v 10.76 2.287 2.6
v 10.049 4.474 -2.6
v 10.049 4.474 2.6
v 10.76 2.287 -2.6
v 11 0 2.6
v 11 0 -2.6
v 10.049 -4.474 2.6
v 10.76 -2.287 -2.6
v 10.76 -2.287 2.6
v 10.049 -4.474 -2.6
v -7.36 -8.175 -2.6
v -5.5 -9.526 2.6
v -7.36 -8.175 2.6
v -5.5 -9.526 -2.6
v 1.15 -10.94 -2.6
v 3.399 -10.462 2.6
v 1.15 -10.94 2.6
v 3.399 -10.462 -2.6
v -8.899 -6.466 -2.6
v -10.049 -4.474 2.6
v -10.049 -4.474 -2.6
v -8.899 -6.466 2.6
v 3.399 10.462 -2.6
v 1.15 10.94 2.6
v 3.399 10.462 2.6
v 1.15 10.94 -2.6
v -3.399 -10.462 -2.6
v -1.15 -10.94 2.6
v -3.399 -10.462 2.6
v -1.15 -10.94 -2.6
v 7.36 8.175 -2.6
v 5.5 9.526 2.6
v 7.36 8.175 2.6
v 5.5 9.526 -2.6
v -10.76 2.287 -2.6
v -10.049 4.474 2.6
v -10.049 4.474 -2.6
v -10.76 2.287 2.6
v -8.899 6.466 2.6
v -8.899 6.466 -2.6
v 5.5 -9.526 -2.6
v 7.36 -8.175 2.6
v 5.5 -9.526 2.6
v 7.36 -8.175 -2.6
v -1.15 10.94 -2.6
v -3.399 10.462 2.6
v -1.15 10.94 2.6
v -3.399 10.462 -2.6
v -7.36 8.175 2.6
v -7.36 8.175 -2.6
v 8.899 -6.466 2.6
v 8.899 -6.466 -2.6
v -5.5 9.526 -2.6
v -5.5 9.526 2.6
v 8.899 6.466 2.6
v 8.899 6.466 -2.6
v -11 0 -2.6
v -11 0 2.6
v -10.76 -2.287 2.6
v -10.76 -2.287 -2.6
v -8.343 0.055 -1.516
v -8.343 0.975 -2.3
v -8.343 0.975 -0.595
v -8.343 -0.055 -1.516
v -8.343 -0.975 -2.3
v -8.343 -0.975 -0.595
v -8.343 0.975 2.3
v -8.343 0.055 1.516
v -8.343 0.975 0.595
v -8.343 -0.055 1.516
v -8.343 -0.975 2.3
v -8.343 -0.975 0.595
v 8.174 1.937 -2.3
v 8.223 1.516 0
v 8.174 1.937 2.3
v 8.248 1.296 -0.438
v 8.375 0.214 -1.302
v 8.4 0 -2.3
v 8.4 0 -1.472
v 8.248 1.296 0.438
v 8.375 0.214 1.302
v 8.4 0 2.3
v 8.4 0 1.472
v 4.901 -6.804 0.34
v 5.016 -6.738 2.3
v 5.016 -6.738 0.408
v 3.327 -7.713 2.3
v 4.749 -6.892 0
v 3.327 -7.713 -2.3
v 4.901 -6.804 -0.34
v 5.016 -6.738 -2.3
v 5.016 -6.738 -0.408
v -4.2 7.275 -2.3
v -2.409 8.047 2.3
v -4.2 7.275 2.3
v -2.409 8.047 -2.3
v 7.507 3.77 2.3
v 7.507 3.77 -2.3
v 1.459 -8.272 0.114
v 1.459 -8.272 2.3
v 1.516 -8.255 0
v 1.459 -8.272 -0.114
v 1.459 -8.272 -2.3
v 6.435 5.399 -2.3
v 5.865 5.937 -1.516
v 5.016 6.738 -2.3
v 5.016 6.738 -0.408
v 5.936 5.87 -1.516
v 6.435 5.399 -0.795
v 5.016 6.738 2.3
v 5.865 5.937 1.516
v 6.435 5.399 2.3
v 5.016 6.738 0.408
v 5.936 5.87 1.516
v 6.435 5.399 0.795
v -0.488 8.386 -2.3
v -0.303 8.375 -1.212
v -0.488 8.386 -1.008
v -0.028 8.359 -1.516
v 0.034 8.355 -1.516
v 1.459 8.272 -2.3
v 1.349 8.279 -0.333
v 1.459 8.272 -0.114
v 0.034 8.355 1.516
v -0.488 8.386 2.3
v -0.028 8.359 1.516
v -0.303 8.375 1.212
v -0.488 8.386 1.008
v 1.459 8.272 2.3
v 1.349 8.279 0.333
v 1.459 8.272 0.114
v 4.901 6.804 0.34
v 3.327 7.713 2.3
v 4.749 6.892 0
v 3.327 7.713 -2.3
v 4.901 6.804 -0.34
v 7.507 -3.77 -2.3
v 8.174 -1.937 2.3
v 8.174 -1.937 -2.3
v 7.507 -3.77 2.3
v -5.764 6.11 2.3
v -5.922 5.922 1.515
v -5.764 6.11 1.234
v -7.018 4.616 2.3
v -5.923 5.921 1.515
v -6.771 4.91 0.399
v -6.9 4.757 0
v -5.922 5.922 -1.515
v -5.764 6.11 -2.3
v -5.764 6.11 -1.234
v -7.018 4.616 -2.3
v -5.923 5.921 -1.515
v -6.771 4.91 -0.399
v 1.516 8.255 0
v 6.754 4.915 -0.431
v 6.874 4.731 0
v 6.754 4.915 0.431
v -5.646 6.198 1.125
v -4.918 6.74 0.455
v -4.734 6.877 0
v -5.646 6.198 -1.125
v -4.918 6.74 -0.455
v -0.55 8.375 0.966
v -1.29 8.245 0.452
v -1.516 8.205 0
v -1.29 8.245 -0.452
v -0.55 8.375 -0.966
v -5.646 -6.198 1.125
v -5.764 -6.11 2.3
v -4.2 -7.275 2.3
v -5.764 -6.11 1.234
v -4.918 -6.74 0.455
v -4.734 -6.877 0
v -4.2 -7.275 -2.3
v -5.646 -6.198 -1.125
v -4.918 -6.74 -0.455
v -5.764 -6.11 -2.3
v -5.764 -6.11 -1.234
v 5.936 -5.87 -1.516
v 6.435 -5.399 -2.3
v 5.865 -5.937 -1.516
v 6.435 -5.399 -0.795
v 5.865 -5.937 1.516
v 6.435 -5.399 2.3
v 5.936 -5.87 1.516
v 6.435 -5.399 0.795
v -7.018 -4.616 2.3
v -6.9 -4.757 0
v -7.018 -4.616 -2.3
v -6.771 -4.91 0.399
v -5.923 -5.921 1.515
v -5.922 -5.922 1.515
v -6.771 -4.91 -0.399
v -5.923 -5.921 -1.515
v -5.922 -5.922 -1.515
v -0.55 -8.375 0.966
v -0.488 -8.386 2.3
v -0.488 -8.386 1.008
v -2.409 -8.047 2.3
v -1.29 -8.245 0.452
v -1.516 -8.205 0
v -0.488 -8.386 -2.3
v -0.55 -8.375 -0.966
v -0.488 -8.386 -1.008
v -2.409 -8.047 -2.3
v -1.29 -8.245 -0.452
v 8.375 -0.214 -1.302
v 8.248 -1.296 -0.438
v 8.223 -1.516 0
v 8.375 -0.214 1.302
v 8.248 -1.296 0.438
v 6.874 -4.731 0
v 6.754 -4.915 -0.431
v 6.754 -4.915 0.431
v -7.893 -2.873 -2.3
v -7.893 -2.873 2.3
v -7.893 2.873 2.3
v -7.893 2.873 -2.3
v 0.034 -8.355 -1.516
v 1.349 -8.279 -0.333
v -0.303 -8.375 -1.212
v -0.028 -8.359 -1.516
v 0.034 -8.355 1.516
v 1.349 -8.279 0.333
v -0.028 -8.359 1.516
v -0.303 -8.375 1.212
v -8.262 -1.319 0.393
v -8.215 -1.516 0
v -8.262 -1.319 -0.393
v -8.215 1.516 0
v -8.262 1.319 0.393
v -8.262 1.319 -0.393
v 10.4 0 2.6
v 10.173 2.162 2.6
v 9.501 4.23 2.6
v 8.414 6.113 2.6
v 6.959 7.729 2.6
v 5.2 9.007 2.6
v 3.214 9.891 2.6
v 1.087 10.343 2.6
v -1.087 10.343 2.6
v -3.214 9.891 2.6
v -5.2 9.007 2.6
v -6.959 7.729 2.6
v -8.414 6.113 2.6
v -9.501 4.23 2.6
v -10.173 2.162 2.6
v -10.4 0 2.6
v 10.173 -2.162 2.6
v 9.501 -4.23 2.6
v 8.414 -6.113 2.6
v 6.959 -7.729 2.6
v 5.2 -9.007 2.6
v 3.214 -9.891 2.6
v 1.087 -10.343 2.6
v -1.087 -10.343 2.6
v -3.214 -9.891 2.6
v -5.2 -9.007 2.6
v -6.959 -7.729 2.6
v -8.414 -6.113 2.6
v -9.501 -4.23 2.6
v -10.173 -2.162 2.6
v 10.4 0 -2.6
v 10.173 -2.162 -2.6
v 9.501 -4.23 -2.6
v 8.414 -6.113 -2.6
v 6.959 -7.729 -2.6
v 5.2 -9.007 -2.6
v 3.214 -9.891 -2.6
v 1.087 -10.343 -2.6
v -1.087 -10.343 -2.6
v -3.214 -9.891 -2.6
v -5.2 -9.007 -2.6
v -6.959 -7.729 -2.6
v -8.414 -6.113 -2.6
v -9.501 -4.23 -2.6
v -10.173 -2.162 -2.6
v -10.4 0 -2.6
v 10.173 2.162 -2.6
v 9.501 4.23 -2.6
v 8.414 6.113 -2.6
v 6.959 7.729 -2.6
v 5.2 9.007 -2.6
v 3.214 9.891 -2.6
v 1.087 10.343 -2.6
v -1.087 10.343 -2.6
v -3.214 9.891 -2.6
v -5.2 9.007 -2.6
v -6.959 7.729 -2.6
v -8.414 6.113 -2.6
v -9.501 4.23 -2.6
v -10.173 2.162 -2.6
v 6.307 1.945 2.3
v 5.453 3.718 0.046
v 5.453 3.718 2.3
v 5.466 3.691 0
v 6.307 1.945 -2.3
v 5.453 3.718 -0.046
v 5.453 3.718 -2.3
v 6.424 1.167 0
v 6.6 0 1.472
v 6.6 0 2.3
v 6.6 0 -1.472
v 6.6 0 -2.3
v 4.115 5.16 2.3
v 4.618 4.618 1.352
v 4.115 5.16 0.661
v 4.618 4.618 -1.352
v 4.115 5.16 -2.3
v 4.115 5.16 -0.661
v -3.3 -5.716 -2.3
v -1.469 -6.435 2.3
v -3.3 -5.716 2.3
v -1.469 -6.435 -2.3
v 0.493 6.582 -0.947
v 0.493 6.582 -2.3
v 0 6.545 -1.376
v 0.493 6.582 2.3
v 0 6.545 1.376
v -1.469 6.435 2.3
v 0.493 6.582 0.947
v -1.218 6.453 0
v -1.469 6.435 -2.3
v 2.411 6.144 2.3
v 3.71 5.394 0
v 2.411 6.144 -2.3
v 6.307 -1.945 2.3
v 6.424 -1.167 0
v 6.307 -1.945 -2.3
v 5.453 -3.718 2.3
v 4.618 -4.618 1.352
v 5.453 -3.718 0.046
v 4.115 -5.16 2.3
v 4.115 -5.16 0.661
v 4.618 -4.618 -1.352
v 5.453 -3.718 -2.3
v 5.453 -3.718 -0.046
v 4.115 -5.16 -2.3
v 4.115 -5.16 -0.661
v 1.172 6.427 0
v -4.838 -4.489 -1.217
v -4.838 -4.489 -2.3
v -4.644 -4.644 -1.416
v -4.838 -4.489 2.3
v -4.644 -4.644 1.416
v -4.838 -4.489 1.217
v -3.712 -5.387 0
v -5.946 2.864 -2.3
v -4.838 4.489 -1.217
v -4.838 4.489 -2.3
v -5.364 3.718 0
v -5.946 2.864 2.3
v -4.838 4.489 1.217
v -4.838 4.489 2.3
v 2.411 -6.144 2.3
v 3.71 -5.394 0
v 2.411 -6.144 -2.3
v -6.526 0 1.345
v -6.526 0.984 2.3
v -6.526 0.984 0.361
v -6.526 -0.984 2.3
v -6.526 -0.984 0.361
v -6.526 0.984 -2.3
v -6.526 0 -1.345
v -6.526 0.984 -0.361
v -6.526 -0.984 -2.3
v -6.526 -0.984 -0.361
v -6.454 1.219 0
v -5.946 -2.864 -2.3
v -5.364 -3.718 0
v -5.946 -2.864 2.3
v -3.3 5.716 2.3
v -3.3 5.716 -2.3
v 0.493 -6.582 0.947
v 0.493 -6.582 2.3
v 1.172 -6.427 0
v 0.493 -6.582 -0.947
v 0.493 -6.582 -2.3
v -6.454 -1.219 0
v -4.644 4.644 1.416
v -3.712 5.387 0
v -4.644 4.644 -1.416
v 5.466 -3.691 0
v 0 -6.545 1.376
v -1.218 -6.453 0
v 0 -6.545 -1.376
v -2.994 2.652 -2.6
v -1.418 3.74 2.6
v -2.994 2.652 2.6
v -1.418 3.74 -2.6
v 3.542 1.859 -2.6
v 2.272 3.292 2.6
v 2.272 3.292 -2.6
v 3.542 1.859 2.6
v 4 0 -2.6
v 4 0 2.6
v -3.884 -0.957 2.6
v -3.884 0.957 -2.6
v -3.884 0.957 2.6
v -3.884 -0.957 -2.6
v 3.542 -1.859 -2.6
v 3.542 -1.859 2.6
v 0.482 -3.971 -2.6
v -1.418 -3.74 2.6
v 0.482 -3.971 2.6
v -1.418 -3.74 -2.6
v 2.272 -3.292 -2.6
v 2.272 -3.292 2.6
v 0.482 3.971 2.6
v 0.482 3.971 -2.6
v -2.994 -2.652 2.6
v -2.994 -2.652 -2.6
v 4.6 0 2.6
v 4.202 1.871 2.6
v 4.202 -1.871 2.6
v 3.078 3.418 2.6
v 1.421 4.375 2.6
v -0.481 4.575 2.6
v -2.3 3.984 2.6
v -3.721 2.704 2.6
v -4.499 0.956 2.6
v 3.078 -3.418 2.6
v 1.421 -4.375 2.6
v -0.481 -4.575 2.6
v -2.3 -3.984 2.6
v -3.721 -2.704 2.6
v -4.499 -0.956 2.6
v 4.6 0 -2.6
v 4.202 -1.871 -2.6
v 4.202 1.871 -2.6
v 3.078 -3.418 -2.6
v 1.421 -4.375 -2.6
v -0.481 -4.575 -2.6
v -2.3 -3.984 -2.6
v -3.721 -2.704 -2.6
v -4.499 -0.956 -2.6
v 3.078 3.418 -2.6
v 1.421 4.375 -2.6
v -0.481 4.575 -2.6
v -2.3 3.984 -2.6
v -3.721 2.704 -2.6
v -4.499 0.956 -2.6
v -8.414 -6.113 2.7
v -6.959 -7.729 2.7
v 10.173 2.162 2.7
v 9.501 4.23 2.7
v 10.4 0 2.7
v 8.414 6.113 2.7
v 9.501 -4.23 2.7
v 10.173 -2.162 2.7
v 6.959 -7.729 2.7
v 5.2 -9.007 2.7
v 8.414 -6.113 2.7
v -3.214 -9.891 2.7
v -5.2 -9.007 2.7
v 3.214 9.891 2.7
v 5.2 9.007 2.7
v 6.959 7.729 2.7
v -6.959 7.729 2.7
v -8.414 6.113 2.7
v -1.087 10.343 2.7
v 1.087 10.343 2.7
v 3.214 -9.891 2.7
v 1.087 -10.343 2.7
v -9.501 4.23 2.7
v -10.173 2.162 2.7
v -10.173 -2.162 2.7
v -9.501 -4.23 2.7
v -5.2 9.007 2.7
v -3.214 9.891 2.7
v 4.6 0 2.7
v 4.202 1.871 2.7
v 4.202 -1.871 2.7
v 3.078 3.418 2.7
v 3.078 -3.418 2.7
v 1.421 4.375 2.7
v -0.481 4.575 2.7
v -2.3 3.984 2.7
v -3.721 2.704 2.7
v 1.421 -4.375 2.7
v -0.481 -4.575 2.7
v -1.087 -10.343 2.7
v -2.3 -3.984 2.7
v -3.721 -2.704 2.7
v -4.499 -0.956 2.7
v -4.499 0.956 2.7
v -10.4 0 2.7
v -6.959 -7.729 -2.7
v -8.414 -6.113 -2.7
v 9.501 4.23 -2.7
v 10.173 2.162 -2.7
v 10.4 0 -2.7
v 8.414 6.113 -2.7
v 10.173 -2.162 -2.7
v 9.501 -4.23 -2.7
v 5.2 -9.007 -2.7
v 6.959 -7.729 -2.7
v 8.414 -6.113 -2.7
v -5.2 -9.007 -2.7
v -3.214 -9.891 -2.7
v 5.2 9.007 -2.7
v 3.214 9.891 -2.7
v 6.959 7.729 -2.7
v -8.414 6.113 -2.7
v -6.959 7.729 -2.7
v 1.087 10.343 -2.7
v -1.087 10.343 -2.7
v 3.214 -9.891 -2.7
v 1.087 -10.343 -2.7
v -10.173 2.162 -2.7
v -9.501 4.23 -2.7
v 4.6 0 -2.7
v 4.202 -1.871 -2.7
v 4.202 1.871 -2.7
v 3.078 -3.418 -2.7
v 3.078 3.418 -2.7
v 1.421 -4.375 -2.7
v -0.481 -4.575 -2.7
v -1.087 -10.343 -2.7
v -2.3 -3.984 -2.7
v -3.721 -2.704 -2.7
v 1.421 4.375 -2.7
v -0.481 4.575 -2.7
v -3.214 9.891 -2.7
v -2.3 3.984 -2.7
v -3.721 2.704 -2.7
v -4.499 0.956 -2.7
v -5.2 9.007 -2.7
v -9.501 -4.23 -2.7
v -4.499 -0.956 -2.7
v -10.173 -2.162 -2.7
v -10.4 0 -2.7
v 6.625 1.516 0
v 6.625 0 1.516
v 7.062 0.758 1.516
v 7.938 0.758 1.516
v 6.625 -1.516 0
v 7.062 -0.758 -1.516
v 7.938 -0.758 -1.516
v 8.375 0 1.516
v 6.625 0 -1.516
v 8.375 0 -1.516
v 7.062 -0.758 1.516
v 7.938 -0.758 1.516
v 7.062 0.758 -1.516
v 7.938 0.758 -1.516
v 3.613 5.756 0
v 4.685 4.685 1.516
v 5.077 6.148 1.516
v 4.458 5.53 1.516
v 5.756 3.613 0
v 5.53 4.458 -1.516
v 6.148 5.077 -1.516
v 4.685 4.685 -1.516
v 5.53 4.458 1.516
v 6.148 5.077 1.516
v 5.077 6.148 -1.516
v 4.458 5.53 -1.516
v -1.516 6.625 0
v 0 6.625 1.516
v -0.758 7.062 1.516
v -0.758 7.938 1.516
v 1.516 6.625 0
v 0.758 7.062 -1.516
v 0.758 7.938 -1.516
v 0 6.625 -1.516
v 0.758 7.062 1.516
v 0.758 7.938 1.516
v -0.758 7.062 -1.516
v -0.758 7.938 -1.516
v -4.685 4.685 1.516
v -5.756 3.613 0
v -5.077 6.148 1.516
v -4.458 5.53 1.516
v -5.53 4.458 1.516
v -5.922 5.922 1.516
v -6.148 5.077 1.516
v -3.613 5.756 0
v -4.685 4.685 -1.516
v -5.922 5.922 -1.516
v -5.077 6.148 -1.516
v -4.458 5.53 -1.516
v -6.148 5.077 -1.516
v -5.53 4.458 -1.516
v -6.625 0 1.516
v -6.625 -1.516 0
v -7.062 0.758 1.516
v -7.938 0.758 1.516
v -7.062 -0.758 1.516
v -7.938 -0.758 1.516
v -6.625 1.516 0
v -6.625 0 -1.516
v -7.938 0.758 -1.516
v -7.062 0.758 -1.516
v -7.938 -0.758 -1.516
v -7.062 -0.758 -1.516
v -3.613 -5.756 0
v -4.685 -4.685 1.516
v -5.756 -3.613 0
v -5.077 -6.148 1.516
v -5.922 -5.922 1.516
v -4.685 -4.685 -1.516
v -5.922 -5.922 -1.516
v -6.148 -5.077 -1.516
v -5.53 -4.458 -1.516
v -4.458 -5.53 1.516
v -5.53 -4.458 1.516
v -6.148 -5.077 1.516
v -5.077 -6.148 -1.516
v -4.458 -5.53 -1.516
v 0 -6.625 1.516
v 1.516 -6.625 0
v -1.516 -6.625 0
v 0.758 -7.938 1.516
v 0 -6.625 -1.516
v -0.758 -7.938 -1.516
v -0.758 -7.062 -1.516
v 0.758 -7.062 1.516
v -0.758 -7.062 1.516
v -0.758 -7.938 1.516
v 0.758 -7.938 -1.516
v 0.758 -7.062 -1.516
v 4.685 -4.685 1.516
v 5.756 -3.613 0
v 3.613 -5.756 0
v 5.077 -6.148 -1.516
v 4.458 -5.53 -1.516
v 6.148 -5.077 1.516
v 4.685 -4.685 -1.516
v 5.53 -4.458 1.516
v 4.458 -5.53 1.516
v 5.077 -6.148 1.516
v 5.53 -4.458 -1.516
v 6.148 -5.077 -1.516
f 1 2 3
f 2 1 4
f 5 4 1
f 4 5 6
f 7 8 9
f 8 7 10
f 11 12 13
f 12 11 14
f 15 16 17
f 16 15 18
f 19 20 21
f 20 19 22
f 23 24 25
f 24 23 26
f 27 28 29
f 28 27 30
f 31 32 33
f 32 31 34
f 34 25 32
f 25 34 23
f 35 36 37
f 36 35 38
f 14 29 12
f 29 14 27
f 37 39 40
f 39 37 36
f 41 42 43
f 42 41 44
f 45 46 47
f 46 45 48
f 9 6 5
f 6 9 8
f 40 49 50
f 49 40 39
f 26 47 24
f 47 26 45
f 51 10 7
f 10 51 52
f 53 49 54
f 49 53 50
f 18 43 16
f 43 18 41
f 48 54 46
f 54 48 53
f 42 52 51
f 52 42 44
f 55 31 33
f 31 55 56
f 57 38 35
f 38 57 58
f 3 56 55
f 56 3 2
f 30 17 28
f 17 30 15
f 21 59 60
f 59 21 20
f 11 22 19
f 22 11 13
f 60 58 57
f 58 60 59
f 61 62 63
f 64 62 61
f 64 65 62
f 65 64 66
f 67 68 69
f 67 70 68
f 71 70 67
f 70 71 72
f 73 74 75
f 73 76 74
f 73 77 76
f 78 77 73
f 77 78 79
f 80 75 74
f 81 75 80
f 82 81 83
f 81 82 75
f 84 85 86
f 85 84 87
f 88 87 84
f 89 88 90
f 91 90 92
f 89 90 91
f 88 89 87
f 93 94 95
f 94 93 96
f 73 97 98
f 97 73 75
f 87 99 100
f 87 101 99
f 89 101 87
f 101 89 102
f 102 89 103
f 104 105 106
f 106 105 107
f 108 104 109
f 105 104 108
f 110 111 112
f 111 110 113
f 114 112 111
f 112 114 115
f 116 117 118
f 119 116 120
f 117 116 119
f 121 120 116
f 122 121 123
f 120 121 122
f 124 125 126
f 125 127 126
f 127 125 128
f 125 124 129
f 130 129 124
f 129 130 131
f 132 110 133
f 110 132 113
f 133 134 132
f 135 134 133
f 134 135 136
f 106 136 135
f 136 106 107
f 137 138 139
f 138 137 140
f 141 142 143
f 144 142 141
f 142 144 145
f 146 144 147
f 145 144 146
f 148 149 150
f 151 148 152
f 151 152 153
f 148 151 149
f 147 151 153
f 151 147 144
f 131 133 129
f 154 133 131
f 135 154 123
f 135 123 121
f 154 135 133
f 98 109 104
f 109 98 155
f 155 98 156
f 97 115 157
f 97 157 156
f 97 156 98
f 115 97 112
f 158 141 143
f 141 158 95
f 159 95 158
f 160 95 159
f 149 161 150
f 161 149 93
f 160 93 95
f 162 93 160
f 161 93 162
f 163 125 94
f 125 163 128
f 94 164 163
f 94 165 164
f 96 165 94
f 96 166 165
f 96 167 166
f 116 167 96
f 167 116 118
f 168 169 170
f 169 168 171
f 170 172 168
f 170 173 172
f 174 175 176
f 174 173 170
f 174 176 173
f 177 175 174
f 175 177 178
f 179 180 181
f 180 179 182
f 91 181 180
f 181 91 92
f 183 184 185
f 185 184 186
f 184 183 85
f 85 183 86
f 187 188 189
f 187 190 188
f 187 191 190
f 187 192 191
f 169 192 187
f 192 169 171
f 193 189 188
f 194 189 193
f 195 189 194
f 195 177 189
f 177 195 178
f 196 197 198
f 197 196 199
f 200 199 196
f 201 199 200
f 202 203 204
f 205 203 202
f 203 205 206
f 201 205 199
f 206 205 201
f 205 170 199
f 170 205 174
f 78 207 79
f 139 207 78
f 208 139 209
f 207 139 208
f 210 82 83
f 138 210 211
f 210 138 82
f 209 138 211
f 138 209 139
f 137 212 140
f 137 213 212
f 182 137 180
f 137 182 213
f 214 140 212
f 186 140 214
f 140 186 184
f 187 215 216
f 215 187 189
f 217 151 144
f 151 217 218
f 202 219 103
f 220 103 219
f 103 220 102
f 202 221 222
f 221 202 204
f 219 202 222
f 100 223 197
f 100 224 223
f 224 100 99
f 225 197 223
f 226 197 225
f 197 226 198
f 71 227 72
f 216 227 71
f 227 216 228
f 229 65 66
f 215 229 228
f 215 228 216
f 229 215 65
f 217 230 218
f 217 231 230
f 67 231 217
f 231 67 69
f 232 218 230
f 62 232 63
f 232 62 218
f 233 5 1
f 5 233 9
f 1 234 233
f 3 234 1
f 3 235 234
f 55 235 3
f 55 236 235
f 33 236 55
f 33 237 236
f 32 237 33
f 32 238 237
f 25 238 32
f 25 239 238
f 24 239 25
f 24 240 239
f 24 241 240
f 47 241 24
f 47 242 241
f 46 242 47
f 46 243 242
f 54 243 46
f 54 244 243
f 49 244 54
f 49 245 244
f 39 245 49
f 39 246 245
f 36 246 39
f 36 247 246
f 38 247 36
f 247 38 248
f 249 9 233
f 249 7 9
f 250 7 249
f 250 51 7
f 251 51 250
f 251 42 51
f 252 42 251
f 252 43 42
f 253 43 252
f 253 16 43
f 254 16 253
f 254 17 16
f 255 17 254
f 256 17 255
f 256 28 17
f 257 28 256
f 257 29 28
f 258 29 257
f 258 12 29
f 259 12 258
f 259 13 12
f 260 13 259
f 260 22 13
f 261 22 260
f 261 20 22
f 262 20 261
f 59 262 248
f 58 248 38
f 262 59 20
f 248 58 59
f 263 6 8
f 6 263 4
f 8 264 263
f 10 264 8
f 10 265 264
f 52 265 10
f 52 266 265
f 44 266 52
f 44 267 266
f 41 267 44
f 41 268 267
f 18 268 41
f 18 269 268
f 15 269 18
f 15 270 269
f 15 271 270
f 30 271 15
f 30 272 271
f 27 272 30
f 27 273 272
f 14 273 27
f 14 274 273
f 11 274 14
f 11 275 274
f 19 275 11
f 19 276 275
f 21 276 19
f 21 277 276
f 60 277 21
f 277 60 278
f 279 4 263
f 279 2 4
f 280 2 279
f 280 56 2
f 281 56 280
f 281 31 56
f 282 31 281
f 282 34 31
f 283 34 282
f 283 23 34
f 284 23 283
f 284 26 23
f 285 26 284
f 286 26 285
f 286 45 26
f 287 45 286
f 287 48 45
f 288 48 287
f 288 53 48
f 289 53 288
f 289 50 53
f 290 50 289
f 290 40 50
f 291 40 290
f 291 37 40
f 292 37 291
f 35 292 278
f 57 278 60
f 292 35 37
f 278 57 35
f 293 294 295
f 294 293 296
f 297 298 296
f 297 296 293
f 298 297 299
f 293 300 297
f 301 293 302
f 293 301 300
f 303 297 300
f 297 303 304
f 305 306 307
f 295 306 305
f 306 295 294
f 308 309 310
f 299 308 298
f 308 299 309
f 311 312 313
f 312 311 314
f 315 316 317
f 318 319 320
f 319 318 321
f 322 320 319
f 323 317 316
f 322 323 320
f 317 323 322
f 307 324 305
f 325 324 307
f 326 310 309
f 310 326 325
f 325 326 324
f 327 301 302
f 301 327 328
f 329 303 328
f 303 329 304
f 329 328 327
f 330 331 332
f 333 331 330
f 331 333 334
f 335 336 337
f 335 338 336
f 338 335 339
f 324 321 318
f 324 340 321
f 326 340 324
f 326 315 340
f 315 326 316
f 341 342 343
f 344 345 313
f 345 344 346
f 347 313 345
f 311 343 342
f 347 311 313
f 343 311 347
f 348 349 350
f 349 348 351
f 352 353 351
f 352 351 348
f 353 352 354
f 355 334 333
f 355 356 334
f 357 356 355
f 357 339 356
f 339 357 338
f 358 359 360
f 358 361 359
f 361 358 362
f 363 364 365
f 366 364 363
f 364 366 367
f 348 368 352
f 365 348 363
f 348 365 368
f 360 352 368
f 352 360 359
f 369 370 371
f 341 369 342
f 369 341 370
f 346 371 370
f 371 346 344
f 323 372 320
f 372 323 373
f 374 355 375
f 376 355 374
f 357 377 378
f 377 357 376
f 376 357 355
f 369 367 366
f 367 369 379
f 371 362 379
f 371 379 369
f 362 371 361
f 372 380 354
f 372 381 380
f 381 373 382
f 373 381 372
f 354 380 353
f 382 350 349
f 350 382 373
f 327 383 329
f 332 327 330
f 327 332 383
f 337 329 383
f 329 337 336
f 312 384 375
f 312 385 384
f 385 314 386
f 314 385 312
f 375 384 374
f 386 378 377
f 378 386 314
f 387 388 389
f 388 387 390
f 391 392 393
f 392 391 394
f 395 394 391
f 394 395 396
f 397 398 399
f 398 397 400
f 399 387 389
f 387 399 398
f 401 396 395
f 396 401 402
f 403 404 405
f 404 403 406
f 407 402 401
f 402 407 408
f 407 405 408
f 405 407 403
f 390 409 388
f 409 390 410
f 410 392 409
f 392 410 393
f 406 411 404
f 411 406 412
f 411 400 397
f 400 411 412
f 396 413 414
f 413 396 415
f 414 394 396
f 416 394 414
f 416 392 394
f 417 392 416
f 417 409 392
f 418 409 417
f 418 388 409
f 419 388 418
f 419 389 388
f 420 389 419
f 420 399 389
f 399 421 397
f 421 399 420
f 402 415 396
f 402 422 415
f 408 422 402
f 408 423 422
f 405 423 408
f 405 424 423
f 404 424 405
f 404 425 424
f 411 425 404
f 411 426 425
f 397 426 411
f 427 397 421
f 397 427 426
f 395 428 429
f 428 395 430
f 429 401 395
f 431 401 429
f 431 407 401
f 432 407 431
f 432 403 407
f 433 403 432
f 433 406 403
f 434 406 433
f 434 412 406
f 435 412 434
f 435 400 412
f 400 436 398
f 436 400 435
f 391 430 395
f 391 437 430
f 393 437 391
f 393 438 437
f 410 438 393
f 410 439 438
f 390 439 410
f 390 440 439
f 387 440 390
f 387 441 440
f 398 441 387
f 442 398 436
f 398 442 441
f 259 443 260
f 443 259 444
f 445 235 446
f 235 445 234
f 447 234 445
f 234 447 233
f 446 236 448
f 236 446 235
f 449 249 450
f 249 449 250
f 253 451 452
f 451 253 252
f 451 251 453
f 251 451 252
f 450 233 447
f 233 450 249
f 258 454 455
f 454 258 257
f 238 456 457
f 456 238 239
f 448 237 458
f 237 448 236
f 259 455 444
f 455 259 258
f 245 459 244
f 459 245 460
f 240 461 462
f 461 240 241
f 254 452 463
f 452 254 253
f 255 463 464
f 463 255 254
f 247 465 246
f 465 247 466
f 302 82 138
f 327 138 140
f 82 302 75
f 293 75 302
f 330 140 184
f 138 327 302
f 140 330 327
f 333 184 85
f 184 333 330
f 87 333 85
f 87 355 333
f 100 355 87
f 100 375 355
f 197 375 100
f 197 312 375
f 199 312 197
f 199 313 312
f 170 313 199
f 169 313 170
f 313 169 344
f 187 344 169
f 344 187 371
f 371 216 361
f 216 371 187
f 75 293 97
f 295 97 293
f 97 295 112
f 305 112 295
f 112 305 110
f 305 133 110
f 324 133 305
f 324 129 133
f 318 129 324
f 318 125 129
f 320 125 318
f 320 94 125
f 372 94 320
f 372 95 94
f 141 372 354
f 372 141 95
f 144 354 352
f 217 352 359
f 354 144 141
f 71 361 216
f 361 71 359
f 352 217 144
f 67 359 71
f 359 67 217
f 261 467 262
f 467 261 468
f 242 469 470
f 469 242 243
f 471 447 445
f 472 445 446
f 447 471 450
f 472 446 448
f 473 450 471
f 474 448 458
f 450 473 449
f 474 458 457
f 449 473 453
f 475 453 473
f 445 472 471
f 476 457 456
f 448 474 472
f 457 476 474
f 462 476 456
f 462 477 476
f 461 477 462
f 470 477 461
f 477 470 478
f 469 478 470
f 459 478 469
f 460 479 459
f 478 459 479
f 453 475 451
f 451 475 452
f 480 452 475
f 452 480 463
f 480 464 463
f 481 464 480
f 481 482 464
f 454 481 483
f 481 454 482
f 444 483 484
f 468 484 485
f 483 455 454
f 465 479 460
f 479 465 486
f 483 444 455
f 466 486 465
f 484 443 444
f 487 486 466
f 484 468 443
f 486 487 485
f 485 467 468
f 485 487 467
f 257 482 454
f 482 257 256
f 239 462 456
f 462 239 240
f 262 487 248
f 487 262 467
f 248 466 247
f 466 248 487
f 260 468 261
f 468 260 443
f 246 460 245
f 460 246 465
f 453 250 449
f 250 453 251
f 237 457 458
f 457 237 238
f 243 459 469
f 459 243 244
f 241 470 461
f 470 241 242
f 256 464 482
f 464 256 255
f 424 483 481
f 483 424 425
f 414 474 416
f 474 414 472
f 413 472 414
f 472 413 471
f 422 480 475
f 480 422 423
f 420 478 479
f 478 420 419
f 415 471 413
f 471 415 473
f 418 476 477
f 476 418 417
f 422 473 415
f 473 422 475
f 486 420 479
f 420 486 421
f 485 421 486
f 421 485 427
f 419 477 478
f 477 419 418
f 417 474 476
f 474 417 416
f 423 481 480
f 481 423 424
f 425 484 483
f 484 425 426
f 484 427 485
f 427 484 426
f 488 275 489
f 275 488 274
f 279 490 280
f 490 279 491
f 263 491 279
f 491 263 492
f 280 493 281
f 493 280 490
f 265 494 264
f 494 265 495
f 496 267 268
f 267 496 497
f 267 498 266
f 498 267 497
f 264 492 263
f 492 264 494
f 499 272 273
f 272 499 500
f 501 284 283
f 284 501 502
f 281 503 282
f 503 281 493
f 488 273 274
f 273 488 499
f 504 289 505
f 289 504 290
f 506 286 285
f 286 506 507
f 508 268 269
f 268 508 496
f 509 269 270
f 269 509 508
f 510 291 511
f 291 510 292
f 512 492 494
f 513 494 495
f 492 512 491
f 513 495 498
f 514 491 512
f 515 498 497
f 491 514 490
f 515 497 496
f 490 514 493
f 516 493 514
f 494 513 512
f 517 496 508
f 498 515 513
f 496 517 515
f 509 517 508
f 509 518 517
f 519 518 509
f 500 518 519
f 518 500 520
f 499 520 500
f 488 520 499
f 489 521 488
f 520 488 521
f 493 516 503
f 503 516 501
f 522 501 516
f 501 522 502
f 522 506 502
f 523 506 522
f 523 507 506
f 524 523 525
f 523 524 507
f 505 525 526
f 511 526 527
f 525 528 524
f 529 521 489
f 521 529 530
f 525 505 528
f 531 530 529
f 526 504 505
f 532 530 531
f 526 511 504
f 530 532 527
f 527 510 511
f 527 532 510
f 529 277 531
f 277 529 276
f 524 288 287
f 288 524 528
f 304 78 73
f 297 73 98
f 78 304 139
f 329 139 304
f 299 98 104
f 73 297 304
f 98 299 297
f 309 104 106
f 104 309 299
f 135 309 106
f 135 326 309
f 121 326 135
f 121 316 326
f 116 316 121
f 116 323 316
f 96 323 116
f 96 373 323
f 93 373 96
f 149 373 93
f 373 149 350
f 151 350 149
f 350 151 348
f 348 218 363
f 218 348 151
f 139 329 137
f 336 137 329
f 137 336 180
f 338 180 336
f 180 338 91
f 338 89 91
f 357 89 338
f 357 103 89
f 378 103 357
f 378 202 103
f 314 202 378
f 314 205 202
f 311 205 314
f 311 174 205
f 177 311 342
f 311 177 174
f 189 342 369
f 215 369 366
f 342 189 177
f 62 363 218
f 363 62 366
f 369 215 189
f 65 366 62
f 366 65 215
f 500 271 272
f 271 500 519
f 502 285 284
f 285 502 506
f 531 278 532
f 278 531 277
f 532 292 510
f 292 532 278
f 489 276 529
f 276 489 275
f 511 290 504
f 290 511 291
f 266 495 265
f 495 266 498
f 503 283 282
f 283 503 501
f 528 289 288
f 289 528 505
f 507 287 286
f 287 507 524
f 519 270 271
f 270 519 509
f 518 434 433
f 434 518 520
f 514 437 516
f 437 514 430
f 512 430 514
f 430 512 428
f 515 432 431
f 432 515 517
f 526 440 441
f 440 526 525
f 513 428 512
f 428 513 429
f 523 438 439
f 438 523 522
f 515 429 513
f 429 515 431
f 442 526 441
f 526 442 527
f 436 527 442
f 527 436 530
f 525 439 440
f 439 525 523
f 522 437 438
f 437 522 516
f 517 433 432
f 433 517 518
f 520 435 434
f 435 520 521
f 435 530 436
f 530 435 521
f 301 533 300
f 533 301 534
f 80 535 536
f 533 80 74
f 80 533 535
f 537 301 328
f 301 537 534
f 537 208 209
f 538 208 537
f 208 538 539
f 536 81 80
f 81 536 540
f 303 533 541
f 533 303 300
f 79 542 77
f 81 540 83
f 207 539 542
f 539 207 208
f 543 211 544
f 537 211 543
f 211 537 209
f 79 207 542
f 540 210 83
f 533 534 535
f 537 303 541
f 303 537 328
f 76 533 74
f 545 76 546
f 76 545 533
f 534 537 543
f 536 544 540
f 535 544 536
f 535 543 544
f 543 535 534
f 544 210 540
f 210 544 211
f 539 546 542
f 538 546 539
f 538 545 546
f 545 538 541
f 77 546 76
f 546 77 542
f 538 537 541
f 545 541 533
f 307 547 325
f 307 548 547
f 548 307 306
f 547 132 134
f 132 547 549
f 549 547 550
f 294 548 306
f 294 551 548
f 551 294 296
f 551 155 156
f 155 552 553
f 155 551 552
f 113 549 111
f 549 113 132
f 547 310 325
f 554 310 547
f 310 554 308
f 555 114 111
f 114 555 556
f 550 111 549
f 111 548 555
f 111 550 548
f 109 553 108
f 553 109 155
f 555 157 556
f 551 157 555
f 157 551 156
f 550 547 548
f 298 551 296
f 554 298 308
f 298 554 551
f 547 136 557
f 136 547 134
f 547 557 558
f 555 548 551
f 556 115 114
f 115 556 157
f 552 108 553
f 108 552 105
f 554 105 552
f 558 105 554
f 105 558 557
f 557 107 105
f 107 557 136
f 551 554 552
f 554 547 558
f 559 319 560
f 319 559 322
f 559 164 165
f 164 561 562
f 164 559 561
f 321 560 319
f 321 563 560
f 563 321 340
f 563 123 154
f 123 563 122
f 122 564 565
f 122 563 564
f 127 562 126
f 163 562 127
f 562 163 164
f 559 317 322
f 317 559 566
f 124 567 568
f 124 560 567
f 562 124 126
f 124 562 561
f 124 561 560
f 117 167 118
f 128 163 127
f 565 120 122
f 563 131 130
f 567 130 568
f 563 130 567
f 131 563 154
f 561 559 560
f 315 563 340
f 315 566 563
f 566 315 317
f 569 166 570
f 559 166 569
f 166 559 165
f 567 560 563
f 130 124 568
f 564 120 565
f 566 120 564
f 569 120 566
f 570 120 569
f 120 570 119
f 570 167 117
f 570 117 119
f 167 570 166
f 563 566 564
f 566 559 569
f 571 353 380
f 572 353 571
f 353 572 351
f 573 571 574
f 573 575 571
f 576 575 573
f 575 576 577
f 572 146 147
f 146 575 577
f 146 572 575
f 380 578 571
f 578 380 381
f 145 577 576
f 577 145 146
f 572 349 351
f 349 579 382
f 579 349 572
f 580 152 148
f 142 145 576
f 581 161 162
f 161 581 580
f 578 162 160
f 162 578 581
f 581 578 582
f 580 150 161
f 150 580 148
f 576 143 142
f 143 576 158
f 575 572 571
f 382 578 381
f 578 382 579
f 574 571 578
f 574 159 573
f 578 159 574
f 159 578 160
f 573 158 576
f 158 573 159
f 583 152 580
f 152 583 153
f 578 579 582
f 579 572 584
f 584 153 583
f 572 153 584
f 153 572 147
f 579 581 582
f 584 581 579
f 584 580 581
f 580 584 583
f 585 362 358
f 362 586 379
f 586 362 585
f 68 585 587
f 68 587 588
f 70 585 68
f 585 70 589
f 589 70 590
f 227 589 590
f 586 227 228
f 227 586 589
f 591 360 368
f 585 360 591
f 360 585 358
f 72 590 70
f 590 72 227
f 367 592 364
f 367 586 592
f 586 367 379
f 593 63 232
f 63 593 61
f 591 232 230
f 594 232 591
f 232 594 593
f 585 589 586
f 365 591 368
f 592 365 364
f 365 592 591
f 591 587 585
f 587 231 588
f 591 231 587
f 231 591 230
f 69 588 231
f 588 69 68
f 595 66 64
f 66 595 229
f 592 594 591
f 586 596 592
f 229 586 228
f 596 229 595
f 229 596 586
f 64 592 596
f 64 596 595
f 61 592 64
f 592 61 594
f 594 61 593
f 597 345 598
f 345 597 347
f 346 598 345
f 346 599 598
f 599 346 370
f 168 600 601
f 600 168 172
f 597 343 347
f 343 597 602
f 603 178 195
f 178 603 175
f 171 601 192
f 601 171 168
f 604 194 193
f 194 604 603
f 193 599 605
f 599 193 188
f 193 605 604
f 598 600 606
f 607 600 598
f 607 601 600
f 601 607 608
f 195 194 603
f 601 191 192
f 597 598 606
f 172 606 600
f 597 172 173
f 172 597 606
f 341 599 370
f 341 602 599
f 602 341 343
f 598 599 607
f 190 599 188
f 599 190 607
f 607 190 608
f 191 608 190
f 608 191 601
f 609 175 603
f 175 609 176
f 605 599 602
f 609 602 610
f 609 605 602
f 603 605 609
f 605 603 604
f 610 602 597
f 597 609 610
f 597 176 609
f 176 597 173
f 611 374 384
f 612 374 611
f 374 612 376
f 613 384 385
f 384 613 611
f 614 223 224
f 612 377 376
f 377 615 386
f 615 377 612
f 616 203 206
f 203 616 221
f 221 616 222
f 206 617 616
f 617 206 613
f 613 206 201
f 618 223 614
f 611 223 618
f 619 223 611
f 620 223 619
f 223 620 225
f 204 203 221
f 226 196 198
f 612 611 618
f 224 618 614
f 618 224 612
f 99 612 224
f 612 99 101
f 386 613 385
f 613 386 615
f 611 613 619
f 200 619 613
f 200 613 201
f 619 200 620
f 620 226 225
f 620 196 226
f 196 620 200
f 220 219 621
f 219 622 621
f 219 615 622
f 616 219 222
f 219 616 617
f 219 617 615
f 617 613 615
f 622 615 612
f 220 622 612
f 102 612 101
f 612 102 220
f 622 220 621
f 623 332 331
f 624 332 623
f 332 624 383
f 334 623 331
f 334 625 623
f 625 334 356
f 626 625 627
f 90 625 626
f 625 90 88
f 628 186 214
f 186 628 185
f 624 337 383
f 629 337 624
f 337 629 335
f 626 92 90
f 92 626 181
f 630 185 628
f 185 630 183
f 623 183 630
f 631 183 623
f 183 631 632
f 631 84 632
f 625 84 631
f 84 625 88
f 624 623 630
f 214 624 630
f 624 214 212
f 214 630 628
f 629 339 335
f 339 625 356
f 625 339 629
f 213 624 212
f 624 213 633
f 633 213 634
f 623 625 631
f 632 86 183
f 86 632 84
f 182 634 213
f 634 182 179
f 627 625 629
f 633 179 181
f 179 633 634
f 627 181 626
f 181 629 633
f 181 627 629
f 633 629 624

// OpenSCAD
// Parameters
bore_diameter_mm = 8; //[4:16:0.1]
outer_diameter_mm = 22; //[11:44:0.1]
width_mm = 7; //[3.5:14:0.1]
ball_count = 8; //[6:12:1]
ball_diameter_mm = 3.5; //[2:5:0.1]
race_radial_thickness_mm = 2.6; //[1.5:5.2:0.1]
race_axial_margin_mm = 0.6; //[0.3:1.5:0.1]
shield_thickness_mm = 0.4; //[0.2:1:0.05]
shield_radial_overlap_mm = 0.6; //[0.3:1.5:0.1]
connection_overlap_mm = 0.8; //[0.5:2:0.1]
inner_radius_mm = 4; //[2:8:0.1]
outer_radius_mm = 11; //[5.5:22:0.1]
inner_race_outer_radius_mm = 6.6; //[4.5:10.4:0.1]
outer_race_inner_radius_mm = 8.4; //[6:18:0.1]
race_height_mm = 5.8; //[2.5:13:0.1]
ball_pitch_radius_mm = 7.5; //[5:10:0.1]
shield_outer_radius_mm = 10.4; //[7:21:0.1]
shield_inner_radius_mm = 5.2; //[3:10:0.1]

// Bearing Ball - complete geometry
module bearing_ball() {
  color("Silver") {
    sphere(r=ball_diameter_mm/2);
  }
}

// Ball Bearing - complete geometry
module ball_bearing() {
  color("DimGray") {
    // Outer Race
    difference() {
      cylinder(r=outer_diameter_mm/2, h=width_mm, center=true);
      translate([0, 0, 0])
        cylinder(r=outer_diameter_mm/2 - race_radial_thickness_mm, h=width_mm + 2*connection_overlap_mm, center=true);
      translate([0, 0, width_mm/2 - race_axial_margin_mm/2])
        cube([outer_diameter_mm*2, outer_diameter_mm*2, width_mm - (width_mm - 2*race_axial_margin_mm)], center=true);
      translate([0, 0, -(width_mm/2 - race_axial_margin_mm/2)])
        cube([outer_diameter_mm*2, outer_diameter_mm*2, width_mm - (width_mm - 2*race_axial_margin_mm)], center=true);
    }
    
    // Inner Race
    difference() {
      cylinder(r=bore_diameter_mm/2 + race_radial_thickness_mm, h=width_mm, center=true);
      translate([0, 0, 0])
        cylinder(r=bore_diameter_mm/2, h=width_mm + 2*connection_overlap_mm, center=true);
      translate([0, 0, width_mm/2 - race_axial_margin_mm/2])
        cube([outer_diameter_mm*2, outer_diameter_mm*2, width_mm - (width_mm - 2*race_axial_margin_mm)], center=true);
      translate([0, 0, -(width_mm/2 - race_axial_margin_mm/2)])
        cube([outer_diameter_mm*2, outer_diameter_mm*2, width_mm - (width_mm - 2*race_axial_margin_mm)], center=true);
    }
    
    // Shields
    difference() {
      translate([0, 0, width_mm/2 - shield_thickness_mm/2 - connection_overlap_mm])
        cylinder(r=outer_diameter_mm/2 - shield_radial_overlap_mm, h=shield_thickness_mm, center=true);
      translate([0, 0, width_mm/2 - shield_thickness_mm/2 - connection_overlap_mm])
        cylinder(r=bore_diameter_mm/2 + shield_radial_overlap_mm, h=shield_thickness_mm + 2*connection_overlap_mm, center=true);
    }
    difference() {
      translate([0, 0, -width_mm/2 + shield_thickness_mm/2 + connection_overlap_mm])
        cylinder(r=outer_diameter_mm/2 - shield_radial_overlap_mm, h=shield_thickness_mm, center=true);
      translate([0, 0, -width_mm/2 + shield_thickness_mm/2 + connection_overlap_mm])
        cylinder(r=bore_diameter_mm/2 + shield_radial_overlap_mm, h=shield_thickness_mm + 2*connection_overlap_mm, center=true);
    }
  }
  
  // Bearing Balls
  color("Silver") {
    for (i = [0:ball_count-1]) {
      rotate([0, 0, i*360/ball_count])
        translate([ball_pitch_radius_mm, 0, 0])
        bearing_ball();
    }
  }
}

// Assembly
module assembly() {
  ball_bearing();
}

assembly();
